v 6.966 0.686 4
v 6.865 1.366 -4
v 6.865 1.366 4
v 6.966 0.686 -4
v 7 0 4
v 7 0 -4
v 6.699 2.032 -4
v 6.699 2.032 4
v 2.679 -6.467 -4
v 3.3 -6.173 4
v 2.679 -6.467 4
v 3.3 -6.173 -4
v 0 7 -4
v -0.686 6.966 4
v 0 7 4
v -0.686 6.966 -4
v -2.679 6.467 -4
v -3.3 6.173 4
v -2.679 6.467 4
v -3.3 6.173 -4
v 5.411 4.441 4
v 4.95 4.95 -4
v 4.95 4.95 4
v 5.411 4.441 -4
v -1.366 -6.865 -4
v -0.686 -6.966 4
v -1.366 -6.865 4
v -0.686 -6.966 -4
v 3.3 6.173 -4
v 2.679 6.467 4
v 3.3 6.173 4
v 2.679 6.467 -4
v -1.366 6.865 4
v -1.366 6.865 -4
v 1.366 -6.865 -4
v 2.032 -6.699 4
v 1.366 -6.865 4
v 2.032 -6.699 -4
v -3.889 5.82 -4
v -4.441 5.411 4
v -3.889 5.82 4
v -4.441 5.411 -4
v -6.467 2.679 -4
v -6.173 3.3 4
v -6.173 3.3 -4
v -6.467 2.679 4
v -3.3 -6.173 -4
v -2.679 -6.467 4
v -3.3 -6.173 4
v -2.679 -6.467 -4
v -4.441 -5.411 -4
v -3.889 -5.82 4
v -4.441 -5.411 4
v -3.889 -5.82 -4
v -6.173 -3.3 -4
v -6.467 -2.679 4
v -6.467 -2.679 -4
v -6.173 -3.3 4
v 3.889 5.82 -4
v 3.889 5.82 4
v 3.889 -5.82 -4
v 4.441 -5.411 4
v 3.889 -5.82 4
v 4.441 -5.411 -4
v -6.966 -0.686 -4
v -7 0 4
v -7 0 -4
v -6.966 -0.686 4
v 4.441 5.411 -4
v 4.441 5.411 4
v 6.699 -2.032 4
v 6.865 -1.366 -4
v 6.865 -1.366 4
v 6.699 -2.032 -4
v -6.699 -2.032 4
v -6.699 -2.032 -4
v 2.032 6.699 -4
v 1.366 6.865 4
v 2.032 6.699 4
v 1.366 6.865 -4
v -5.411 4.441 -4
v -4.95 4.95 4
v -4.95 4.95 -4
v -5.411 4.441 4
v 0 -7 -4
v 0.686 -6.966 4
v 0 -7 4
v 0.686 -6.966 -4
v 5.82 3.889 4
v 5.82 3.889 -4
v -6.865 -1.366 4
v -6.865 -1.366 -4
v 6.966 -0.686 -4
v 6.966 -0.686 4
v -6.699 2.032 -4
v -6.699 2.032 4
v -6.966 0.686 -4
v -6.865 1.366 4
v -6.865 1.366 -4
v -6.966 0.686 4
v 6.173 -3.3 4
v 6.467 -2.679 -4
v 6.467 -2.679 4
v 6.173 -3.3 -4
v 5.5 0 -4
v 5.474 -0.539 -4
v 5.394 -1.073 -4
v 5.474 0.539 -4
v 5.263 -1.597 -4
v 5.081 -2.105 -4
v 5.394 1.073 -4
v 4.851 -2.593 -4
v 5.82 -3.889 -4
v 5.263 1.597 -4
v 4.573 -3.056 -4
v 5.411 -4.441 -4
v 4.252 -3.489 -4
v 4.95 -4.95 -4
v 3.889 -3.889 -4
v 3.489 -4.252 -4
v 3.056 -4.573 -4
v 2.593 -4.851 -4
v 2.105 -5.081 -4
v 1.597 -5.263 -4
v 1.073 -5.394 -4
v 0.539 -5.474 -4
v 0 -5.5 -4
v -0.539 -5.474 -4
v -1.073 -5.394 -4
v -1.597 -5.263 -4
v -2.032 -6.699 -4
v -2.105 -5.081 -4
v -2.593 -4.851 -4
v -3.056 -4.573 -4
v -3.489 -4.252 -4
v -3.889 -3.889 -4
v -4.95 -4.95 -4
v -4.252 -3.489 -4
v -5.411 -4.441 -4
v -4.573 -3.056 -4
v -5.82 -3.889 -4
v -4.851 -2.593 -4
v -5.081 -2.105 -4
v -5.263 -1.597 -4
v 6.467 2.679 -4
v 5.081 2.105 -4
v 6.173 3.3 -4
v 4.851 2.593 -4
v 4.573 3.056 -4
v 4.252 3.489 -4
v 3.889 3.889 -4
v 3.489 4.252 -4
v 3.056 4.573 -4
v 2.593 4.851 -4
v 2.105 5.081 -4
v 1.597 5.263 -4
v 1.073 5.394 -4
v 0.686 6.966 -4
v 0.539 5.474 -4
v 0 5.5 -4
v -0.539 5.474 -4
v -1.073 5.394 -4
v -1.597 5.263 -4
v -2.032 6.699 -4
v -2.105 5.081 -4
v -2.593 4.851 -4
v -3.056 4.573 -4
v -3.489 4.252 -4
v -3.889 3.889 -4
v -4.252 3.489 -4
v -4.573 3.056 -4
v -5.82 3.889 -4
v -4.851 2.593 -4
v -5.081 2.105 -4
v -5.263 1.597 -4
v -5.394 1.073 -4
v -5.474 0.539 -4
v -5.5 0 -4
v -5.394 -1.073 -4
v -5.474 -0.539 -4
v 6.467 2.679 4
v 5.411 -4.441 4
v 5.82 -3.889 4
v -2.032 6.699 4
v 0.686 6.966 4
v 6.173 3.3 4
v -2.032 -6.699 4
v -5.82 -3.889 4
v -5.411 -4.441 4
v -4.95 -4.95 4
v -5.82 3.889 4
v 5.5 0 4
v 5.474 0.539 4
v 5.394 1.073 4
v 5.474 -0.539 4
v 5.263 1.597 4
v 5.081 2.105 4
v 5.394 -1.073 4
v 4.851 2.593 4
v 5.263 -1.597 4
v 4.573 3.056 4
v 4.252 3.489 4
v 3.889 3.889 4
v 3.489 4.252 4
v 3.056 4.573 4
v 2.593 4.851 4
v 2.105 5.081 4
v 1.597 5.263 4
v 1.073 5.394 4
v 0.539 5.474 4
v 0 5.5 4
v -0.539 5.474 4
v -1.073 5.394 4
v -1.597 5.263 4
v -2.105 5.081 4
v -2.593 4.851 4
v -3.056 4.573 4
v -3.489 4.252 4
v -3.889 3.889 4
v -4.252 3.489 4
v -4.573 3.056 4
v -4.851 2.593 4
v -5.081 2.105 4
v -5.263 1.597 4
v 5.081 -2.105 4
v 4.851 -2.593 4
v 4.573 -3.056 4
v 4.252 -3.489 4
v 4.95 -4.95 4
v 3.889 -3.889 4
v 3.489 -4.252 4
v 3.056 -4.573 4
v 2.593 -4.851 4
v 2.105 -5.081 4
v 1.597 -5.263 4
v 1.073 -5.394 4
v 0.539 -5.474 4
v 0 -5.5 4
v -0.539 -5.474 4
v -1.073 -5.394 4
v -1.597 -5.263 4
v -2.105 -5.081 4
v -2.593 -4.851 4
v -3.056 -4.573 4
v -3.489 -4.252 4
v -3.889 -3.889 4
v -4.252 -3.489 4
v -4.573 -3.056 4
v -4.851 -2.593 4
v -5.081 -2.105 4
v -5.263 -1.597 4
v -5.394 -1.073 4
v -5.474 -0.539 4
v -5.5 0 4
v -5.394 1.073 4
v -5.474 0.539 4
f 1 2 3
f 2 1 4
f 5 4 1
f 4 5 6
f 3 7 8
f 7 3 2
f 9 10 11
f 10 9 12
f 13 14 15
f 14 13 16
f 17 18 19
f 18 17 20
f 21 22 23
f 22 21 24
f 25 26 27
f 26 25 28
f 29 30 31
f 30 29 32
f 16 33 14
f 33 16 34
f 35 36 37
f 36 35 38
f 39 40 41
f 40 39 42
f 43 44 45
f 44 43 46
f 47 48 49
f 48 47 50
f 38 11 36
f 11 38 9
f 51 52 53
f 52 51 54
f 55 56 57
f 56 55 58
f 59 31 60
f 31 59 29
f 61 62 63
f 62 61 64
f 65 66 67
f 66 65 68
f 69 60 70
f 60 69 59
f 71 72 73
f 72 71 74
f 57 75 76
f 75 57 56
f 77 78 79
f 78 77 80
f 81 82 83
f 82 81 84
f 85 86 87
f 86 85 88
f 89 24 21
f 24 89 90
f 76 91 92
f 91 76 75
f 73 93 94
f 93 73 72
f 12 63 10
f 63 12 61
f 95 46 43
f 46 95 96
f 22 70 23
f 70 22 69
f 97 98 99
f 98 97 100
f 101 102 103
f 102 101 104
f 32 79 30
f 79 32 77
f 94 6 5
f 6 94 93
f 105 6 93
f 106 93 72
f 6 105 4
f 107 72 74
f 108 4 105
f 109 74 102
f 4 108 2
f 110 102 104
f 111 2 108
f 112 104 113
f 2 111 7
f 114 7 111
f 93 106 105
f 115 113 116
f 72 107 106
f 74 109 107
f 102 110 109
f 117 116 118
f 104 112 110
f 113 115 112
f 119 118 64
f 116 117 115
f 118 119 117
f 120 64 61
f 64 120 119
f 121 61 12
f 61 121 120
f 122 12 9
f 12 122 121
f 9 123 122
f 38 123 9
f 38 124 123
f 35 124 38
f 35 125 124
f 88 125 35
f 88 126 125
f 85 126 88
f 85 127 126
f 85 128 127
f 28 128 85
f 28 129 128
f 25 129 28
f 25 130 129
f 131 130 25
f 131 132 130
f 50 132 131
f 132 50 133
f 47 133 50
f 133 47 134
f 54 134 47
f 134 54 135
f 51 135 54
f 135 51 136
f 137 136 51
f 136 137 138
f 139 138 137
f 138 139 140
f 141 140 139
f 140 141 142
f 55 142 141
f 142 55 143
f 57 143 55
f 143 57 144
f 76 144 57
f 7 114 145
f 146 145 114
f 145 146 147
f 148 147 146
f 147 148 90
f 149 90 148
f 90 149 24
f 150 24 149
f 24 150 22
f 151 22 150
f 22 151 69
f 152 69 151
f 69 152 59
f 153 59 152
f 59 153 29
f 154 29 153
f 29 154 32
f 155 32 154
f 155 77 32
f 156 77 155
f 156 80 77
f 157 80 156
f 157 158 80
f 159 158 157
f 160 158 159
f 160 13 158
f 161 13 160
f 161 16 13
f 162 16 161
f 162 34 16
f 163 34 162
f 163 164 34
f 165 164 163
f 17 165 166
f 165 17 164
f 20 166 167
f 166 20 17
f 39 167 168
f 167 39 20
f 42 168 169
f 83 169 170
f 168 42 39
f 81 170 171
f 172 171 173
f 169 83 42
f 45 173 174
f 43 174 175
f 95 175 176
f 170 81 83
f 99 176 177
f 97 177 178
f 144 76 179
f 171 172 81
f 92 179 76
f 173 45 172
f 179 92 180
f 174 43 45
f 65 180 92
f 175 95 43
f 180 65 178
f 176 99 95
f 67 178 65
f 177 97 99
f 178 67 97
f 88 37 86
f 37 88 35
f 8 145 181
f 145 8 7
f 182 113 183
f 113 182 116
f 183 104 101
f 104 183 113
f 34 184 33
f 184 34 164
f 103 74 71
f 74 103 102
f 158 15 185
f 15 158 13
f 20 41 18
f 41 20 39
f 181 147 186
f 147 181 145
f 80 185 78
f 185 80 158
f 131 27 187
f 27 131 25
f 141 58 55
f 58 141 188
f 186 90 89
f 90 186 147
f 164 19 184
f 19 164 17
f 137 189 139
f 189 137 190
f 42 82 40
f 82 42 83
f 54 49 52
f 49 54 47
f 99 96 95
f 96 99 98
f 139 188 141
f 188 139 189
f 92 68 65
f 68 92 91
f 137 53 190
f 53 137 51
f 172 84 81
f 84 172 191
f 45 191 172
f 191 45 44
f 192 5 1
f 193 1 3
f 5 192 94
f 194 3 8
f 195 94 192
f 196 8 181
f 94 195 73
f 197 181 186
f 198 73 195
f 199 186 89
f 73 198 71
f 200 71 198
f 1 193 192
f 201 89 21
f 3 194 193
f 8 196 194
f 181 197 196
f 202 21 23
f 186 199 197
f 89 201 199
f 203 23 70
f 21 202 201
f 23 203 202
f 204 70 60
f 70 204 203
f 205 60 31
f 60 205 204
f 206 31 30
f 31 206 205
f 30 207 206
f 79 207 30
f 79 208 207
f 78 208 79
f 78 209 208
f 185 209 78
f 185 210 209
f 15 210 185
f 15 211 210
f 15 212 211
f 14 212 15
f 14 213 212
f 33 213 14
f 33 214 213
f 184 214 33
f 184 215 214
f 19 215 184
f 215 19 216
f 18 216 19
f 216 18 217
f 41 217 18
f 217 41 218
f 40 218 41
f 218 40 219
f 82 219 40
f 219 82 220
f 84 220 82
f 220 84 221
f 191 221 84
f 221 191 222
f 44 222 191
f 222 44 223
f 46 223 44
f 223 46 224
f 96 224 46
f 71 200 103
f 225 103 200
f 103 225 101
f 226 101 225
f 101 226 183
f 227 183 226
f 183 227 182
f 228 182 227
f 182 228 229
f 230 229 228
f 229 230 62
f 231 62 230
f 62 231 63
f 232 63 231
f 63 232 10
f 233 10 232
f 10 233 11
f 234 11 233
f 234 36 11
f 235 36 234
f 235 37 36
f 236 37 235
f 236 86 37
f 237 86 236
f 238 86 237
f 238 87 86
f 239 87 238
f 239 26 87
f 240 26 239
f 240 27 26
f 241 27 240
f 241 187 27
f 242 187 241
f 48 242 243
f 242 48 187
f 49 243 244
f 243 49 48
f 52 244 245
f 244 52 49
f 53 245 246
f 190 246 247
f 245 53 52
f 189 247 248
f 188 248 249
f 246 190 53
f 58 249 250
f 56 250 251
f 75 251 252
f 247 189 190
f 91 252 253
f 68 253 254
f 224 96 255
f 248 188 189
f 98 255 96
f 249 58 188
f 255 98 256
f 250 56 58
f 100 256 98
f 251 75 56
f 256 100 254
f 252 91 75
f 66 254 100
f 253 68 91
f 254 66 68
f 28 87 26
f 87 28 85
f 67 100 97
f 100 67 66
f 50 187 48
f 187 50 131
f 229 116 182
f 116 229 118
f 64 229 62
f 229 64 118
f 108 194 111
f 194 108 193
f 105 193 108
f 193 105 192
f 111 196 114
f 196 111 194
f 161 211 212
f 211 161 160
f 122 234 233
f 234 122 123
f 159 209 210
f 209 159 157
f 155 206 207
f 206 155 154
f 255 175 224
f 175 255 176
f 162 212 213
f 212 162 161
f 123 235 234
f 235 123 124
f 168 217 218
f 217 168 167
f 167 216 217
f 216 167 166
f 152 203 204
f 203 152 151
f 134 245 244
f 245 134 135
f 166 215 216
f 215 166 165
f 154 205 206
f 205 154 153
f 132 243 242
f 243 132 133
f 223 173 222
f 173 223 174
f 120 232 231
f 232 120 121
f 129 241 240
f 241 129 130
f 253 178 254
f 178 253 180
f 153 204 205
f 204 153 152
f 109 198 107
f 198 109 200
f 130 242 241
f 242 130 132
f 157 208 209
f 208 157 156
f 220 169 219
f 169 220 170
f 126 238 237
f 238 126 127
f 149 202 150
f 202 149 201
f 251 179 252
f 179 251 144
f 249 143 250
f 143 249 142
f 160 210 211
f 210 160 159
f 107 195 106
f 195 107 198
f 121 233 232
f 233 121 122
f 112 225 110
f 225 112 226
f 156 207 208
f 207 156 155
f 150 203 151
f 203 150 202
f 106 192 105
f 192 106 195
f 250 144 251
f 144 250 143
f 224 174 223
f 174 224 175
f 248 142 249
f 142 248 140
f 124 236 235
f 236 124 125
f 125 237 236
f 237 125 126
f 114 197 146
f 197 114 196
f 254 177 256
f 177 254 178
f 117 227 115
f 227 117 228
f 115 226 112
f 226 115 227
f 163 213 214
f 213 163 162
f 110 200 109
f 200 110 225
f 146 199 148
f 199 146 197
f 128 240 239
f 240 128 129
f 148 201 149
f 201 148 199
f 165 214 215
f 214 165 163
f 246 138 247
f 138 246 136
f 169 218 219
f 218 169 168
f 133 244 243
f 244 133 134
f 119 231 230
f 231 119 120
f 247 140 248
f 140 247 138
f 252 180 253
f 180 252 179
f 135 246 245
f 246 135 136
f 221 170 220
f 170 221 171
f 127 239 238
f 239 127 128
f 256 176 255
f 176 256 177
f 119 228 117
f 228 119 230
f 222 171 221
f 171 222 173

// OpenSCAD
/* Washer
can be useful in any project */
$fn=64;
id=11;
od=14;
h=8;
difference() {
  cylinder(d=od,h=h,center=true);
  cylinder(d=id,h=h+0.02,center=true);
}
